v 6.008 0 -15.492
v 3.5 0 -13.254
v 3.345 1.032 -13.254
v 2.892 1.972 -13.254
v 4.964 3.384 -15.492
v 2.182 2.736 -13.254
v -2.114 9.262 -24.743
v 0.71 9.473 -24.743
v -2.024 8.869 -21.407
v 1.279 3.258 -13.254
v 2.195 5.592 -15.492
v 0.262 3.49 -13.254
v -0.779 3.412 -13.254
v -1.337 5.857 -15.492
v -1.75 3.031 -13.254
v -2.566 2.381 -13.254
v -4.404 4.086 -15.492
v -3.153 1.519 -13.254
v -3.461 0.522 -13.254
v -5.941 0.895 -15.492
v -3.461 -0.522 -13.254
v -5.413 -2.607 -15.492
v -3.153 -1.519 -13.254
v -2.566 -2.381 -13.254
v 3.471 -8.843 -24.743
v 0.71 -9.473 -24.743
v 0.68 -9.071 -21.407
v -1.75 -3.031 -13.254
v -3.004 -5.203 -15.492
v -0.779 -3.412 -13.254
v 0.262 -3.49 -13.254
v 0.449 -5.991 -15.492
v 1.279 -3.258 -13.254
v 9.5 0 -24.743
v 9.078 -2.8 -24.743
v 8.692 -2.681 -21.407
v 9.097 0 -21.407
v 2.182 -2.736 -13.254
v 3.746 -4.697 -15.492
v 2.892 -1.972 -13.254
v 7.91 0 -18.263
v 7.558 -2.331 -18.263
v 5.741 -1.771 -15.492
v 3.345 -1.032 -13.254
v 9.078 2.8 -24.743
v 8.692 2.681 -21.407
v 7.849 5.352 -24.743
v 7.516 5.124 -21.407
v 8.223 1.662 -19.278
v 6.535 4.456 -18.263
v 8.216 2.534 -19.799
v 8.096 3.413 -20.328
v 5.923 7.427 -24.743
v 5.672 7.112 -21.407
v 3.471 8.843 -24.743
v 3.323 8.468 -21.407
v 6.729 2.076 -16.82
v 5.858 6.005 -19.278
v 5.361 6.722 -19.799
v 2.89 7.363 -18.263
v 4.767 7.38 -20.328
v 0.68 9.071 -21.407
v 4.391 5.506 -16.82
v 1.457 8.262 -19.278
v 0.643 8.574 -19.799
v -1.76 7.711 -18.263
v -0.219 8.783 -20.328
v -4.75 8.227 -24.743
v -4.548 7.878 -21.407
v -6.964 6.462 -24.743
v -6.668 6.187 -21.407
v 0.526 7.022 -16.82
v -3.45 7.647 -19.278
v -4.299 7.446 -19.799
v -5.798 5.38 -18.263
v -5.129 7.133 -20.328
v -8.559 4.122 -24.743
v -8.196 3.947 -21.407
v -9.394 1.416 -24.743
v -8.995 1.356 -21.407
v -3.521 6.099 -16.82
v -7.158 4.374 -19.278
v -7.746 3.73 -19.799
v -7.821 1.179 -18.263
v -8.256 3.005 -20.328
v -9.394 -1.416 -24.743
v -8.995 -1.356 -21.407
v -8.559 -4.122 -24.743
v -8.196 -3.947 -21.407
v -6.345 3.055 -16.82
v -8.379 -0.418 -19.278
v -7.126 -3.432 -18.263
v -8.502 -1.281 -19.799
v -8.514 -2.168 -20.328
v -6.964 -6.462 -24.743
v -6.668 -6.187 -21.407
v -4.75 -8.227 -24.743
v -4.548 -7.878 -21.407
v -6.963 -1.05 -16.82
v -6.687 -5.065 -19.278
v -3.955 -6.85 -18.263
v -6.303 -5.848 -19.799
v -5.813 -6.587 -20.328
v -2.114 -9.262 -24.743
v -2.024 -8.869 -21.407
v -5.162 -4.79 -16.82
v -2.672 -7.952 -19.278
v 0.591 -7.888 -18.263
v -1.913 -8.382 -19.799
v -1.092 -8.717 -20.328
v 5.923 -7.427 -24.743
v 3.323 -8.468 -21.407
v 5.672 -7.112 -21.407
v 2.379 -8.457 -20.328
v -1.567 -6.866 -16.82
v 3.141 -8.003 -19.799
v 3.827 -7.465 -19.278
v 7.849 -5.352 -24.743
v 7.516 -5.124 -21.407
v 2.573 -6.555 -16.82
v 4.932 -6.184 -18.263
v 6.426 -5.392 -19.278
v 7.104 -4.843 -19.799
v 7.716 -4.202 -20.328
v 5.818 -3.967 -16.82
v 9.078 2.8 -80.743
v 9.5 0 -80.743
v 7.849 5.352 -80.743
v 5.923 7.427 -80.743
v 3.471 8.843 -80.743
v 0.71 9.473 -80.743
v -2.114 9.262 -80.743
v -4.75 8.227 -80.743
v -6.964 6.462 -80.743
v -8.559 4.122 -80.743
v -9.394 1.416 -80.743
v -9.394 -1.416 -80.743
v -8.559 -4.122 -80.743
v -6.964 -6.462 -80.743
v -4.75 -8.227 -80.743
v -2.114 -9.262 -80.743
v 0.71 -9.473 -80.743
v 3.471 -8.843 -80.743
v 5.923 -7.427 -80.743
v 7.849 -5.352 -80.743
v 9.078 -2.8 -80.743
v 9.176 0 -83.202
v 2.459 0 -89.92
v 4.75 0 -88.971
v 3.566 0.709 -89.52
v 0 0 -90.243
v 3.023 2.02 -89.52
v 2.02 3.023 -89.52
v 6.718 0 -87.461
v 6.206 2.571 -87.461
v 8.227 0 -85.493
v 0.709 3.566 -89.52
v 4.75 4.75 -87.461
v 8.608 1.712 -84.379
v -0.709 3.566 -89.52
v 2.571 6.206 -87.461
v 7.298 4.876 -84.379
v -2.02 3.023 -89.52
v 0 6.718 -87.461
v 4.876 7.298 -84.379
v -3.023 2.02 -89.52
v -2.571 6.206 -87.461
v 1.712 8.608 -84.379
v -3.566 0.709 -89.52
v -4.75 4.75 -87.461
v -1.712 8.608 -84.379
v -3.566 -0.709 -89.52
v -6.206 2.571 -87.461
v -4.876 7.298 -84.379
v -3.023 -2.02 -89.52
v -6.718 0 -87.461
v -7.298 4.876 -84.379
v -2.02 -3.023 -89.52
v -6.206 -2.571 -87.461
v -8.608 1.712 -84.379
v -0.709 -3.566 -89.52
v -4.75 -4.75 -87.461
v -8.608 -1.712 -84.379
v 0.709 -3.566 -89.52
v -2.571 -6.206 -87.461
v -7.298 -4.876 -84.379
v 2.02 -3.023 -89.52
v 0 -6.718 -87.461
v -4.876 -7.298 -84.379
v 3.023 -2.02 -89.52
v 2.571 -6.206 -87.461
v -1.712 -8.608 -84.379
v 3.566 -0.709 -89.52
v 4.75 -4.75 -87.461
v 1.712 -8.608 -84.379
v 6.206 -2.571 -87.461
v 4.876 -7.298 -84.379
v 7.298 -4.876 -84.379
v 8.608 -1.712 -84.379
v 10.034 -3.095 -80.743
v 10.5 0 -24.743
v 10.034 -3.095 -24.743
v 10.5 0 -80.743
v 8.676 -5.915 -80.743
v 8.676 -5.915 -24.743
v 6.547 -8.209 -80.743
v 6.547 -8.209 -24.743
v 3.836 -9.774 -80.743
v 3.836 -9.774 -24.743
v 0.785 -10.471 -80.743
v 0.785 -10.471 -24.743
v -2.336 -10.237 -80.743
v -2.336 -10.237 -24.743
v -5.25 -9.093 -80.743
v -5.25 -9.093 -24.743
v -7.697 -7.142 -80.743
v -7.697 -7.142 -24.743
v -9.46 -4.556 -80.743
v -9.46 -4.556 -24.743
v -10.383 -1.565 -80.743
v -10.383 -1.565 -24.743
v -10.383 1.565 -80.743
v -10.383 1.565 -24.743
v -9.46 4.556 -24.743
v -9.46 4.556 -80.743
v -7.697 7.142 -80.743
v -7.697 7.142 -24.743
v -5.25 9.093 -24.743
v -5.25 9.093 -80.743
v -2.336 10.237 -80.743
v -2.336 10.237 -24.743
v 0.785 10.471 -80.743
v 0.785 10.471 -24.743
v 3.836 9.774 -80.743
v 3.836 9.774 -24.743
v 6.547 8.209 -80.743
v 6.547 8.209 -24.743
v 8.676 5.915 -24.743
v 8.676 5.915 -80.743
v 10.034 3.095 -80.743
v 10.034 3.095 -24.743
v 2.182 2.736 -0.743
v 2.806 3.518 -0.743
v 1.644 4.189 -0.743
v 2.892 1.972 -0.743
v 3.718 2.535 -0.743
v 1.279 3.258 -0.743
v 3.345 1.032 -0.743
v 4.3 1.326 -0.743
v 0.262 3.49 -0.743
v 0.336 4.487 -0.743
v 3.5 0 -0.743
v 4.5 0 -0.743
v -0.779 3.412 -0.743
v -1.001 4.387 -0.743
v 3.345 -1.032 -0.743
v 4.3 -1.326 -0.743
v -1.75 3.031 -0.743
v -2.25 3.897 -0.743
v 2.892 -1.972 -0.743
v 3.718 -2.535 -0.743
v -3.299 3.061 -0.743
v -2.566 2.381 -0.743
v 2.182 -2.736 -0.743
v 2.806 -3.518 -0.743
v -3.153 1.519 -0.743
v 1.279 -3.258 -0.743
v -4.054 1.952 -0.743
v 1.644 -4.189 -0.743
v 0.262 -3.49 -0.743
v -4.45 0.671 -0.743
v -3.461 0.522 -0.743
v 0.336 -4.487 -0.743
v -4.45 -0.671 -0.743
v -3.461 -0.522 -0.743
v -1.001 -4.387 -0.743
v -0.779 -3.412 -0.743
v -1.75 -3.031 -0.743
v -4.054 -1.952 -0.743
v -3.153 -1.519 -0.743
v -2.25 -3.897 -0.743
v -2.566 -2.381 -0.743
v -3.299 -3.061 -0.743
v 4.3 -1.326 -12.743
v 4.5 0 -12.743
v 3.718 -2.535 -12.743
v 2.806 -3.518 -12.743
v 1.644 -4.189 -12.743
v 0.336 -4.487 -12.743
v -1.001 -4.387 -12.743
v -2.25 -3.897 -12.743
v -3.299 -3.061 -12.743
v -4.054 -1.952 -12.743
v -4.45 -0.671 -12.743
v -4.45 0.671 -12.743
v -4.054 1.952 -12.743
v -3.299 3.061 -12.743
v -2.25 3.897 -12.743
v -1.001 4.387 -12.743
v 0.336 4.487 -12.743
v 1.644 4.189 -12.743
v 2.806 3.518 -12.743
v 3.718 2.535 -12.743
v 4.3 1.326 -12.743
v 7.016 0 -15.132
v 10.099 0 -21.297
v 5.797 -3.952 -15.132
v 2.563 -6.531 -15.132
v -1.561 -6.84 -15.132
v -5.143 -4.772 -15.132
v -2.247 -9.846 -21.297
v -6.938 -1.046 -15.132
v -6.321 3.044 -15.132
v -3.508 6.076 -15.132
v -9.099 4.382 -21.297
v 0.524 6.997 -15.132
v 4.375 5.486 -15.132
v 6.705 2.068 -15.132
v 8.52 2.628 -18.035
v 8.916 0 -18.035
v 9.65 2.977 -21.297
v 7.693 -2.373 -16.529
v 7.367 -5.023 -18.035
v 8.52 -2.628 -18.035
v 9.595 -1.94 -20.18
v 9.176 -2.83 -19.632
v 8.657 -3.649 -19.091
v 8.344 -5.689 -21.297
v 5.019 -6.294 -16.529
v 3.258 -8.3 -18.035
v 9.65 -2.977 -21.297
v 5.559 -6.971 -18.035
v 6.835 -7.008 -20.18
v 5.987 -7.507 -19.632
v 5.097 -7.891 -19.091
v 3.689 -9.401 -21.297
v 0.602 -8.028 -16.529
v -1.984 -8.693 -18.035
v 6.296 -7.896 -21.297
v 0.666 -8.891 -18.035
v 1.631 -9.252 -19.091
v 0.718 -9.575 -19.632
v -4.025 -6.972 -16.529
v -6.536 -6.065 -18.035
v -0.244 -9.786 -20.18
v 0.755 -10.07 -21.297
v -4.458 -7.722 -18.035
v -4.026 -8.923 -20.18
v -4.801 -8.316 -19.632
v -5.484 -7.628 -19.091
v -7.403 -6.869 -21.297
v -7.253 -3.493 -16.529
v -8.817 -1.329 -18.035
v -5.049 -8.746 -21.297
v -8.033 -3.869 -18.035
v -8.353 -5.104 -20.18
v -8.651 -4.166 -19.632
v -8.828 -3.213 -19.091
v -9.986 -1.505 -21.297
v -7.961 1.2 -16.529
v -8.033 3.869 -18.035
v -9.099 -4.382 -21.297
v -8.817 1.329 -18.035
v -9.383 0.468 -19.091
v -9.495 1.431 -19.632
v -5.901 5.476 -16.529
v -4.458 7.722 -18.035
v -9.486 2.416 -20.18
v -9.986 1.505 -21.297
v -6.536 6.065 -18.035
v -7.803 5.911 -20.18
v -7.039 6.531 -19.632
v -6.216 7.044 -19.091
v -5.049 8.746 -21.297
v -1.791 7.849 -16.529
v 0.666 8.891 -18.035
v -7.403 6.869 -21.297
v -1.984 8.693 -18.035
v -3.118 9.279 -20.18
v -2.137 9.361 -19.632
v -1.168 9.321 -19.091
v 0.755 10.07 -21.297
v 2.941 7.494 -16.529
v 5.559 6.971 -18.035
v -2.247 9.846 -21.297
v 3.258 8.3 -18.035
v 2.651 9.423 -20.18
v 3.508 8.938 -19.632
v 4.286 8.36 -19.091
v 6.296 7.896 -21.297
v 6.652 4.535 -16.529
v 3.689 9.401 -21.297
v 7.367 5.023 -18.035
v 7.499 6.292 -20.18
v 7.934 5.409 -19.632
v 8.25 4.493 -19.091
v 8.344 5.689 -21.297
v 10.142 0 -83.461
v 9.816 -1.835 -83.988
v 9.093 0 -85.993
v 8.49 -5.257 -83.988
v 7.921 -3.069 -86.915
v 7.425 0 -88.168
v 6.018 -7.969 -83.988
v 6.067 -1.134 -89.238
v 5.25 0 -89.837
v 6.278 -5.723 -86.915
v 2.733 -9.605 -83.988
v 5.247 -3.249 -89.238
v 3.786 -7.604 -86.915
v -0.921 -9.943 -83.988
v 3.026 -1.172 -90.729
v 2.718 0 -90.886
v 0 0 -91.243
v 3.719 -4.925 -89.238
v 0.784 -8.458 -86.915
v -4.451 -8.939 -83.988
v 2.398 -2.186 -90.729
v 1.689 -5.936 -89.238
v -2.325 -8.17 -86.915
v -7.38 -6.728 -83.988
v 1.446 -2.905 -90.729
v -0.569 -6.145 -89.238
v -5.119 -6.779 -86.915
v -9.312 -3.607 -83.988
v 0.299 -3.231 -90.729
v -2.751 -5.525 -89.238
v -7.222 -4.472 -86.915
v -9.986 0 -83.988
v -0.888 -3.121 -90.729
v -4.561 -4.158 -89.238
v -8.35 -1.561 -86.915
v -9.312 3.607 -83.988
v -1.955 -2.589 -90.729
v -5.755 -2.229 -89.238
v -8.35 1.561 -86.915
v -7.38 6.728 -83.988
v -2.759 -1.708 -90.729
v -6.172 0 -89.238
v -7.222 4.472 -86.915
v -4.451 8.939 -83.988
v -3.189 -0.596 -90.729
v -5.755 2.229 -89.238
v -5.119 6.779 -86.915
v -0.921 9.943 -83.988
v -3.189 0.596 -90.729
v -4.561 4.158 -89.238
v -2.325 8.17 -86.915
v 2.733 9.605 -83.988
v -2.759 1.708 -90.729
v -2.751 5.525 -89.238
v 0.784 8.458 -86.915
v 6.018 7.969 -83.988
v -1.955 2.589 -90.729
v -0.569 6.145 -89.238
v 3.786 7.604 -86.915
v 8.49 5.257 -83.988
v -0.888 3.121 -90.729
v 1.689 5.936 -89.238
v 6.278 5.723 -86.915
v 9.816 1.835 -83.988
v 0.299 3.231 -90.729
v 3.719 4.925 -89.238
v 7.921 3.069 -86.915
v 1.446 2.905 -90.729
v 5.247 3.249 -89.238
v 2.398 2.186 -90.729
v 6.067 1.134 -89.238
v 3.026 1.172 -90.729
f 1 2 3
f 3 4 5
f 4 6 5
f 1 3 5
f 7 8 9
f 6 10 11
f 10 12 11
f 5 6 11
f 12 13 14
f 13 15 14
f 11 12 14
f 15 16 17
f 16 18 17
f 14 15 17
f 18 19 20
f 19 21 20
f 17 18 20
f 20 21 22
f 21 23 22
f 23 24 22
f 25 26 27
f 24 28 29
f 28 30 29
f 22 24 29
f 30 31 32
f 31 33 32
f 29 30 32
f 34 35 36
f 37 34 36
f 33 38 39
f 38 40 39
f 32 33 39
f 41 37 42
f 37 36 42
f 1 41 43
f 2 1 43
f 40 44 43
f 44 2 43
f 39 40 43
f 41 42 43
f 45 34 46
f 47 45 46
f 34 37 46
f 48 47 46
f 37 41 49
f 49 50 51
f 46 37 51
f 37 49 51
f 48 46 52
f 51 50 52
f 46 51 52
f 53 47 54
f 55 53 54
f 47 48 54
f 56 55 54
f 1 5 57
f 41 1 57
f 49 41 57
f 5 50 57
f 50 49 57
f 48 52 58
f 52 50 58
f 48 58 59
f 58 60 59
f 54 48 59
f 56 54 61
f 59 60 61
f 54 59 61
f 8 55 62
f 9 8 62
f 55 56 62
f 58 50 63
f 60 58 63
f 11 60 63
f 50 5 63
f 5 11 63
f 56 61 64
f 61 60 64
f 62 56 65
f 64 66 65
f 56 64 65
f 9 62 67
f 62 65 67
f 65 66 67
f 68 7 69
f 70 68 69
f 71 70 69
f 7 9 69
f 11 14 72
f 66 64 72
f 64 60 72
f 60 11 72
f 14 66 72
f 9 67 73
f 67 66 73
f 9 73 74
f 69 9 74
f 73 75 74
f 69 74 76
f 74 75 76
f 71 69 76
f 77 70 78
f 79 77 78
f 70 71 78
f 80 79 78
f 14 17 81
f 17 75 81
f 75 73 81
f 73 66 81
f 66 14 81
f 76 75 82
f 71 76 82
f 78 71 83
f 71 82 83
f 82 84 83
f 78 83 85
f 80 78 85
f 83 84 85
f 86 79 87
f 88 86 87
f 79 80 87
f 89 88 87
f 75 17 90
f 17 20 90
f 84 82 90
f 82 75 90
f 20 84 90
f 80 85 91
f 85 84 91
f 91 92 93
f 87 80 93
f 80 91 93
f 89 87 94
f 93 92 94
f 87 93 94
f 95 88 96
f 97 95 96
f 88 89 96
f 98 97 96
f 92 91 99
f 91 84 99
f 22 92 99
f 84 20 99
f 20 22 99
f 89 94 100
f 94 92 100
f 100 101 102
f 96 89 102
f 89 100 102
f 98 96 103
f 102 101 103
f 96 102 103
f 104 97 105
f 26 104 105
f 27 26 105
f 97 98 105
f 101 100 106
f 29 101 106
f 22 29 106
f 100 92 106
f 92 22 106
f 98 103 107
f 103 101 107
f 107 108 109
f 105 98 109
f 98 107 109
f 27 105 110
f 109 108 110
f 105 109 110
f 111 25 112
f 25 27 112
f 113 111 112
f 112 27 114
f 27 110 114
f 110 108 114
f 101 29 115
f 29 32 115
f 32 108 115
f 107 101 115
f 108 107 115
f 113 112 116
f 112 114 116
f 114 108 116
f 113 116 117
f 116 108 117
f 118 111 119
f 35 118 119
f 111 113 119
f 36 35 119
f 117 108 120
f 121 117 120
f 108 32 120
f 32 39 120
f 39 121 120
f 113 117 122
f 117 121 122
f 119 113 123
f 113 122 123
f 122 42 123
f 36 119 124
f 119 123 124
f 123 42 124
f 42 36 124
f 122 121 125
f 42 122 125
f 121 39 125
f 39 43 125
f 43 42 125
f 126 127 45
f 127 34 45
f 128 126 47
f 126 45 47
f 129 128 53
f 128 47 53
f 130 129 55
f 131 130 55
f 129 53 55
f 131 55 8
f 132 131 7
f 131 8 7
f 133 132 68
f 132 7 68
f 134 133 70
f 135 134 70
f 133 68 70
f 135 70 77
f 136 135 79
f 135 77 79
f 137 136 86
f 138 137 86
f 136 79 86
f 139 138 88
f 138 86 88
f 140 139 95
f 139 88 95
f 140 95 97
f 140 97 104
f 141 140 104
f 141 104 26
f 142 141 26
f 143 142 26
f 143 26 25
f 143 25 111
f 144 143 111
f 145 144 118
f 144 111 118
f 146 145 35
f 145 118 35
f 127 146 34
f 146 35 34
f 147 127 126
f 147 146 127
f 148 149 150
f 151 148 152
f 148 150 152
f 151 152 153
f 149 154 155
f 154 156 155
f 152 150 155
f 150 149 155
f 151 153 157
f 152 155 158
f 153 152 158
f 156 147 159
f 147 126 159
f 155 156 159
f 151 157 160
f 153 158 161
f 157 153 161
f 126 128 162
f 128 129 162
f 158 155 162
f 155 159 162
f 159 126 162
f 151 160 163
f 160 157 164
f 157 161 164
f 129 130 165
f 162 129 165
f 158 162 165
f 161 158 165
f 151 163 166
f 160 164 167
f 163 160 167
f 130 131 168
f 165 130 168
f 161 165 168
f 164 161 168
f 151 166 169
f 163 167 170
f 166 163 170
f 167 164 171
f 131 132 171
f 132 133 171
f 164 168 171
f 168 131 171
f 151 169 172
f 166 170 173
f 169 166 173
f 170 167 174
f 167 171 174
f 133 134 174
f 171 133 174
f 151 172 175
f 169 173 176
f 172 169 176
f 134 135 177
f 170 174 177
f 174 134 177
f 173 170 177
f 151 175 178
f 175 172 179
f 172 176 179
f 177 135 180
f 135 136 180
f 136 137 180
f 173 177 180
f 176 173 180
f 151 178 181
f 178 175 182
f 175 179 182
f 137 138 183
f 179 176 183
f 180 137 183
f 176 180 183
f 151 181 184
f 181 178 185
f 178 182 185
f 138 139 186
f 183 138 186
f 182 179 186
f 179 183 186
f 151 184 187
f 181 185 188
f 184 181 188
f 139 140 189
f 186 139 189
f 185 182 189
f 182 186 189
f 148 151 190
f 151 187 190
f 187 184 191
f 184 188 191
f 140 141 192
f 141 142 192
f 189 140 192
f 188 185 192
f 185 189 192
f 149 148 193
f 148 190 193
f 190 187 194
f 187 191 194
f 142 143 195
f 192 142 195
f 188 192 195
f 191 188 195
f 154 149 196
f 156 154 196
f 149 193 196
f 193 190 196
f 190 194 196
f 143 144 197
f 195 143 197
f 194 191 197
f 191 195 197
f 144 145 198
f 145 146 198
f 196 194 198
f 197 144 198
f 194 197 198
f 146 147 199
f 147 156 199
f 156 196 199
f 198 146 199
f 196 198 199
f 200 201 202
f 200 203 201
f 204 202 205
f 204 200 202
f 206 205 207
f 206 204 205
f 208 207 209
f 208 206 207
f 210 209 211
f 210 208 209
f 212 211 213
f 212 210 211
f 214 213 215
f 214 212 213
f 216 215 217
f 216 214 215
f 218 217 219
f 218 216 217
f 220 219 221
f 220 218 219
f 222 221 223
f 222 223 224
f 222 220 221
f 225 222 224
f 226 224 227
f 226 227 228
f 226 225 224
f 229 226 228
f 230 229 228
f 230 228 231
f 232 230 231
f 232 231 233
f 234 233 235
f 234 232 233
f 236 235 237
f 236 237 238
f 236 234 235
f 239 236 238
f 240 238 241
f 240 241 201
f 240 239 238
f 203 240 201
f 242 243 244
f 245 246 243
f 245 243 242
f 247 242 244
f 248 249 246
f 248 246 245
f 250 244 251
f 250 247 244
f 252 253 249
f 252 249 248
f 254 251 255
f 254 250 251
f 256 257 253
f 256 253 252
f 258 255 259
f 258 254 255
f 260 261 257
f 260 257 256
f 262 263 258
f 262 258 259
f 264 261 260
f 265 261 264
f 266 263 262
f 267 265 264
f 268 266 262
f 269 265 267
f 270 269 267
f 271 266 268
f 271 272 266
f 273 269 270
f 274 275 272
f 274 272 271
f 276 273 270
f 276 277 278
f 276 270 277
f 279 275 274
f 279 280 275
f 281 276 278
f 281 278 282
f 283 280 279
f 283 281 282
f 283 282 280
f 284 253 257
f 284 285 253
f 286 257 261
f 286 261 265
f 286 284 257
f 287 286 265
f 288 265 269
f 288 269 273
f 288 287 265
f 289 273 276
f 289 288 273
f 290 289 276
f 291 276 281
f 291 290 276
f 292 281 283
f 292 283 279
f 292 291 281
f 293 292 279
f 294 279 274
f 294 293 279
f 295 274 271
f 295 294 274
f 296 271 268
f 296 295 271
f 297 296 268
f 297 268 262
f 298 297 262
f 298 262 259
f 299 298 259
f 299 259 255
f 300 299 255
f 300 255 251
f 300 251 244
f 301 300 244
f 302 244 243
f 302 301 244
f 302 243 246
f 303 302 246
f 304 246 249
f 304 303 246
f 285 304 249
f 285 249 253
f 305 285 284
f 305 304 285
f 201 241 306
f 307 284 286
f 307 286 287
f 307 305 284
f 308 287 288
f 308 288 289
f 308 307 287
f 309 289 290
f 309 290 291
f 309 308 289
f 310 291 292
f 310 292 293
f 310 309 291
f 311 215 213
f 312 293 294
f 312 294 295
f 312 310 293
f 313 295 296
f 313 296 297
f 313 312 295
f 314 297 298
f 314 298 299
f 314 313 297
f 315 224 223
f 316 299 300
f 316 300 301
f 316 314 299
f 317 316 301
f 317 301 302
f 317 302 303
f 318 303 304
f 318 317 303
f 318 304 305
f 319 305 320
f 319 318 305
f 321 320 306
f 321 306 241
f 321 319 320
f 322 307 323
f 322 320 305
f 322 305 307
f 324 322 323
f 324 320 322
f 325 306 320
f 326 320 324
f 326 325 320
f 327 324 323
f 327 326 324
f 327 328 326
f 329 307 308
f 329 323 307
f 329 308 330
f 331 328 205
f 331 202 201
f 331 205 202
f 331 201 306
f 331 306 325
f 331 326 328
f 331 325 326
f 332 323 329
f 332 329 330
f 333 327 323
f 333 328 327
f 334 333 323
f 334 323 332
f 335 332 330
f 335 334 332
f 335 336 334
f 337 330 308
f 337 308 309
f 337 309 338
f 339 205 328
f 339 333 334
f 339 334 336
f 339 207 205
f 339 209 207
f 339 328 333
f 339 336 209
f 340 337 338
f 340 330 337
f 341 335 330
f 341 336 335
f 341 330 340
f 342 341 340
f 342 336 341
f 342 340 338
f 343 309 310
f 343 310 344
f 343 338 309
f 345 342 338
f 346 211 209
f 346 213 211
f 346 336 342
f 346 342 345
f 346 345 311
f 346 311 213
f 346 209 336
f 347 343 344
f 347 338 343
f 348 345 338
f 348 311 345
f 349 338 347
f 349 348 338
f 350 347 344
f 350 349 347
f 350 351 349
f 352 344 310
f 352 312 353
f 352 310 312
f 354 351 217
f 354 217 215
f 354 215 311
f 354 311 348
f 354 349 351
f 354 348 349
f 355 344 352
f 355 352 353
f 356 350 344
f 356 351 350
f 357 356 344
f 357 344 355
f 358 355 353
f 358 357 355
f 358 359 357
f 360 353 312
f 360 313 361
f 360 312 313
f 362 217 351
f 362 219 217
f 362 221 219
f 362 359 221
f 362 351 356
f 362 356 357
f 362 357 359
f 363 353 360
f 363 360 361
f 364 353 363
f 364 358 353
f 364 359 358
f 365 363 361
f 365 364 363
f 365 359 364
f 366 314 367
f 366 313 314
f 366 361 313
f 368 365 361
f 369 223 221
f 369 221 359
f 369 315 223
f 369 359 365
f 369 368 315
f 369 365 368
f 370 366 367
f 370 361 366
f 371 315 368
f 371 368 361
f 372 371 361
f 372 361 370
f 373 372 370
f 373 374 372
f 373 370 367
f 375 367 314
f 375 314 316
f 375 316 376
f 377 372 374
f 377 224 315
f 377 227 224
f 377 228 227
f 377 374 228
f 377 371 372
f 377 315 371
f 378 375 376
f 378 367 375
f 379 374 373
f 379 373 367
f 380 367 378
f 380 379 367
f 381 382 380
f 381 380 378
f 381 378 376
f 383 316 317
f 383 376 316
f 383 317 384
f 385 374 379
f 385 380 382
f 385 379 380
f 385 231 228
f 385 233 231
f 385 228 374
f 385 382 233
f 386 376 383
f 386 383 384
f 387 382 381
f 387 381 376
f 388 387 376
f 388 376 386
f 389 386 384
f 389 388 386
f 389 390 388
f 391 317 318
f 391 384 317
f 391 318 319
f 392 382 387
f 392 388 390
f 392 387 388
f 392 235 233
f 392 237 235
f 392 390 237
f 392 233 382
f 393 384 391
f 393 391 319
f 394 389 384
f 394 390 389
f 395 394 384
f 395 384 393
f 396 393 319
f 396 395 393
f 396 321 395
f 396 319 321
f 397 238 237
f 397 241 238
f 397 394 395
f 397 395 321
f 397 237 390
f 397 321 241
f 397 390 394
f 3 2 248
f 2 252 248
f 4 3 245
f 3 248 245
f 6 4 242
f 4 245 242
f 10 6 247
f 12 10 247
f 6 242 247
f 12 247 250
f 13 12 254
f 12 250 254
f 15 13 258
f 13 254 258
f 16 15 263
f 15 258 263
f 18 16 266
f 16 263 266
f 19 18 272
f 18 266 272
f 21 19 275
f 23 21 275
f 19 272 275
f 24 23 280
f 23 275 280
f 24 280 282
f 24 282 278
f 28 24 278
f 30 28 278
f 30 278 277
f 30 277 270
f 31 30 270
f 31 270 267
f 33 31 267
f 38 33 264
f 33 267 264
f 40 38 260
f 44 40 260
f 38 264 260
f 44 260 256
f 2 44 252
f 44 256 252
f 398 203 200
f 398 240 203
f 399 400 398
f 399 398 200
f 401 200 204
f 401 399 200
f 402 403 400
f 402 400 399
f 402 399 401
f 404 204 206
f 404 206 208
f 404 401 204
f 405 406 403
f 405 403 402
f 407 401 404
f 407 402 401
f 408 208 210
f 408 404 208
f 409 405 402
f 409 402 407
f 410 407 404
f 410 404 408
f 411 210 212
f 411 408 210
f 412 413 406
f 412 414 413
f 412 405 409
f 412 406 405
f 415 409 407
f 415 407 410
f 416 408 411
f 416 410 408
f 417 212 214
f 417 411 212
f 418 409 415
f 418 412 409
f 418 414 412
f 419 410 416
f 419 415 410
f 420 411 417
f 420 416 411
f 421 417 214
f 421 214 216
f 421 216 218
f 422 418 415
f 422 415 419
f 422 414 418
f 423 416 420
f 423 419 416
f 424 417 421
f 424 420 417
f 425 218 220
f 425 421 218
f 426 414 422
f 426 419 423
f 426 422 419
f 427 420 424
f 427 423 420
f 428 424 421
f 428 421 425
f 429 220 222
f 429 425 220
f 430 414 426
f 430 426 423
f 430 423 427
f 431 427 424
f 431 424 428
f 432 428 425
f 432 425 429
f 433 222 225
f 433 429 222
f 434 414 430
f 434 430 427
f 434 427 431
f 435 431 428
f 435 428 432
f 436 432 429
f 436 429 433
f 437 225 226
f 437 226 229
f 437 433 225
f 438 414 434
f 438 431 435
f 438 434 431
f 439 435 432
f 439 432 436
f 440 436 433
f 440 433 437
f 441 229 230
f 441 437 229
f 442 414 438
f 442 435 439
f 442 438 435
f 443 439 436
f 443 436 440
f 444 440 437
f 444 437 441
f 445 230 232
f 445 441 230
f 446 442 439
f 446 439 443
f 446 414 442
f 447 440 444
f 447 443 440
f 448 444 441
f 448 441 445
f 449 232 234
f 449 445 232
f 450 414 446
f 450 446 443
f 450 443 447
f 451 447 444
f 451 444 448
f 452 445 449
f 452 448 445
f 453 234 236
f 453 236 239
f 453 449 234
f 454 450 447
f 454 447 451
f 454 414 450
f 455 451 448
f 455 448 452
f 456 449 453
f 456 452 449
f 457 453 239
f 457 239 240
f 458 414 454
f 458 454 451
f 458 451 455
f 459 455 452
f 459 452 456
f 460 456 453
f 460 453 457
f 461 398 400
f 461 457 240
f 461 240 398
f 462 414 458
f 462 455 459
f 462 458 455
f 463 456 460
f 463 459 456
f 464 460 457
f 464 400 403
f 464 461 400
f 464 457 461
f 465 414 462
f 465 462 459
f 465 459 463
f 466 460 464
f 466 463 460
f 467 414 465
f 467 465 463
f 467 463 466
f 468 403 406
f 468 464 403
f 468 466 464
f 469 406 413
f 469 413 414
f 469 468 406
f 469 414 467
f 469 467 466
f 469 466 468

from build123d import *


# Read off the part's stored shape, not the designer's step: Shell1
with BuildPart() as part:
    # Sketch1 → Revolve1 (revolve)
    with BuildSketch(Plane(origin=(0, 0, 0), x_dir=(0, 0, -1), z_dir=(1, 0, 0)), mode=Mode.PRIVATE) as revolve1_sk:
        with BuildLine():
            Line((0.74336912, 4.5), (12.74336912, 4.5))
            ThreePointArc((12.74336912, 4.5), (18.035165187, 8.916407865), (24.74336912, 10.5))
            Line((24.74336912, 10.5), (80.74336912, 10.5))
            ThreePointArc((80.74336912, 10.5), (88.167990322, 7.424621202), (91.24336912, 0))
            Line((91.24336912, 0), (0.74336912, 0))
            Line((0.74336912, 0), (0.74336912, 4.5))
        make_face()
    revolve(revolve1_sk.sketch.rotate(Axis((0, 0, 0), (0, 0, -1)), 90), axis=Axis((0, 0, 0), (0, 0, -1)))

    # Shell1 outline → Shell1 (revolve, cut)
    with BuildSketch(Plane.XZ):
        with BuildLine():
            Line((0, -0.74336912), (0, -90.24336912))
            ThreePointArc((0, -90.24336912), (6.717514422, -87.46088354), (9.5, -80.743369117))
            Line((9.5, -80.743369117), (9.5, -24.74336912))
            ThreePointArc((9.5, -24.74336912), (7.909673646, -18.262628421), (3.5, -13.254243826))
            Line((3.5, -13.254243826), (3.5, -0.74336912))
            Line((3.5, -0.74336912), (0, -0.74336912))
        make_face()
    revolve(axis=Axis((0, 0, 0), (0, 0, 1)), mode=Mode.SUBTRACT)


solid = part.part
